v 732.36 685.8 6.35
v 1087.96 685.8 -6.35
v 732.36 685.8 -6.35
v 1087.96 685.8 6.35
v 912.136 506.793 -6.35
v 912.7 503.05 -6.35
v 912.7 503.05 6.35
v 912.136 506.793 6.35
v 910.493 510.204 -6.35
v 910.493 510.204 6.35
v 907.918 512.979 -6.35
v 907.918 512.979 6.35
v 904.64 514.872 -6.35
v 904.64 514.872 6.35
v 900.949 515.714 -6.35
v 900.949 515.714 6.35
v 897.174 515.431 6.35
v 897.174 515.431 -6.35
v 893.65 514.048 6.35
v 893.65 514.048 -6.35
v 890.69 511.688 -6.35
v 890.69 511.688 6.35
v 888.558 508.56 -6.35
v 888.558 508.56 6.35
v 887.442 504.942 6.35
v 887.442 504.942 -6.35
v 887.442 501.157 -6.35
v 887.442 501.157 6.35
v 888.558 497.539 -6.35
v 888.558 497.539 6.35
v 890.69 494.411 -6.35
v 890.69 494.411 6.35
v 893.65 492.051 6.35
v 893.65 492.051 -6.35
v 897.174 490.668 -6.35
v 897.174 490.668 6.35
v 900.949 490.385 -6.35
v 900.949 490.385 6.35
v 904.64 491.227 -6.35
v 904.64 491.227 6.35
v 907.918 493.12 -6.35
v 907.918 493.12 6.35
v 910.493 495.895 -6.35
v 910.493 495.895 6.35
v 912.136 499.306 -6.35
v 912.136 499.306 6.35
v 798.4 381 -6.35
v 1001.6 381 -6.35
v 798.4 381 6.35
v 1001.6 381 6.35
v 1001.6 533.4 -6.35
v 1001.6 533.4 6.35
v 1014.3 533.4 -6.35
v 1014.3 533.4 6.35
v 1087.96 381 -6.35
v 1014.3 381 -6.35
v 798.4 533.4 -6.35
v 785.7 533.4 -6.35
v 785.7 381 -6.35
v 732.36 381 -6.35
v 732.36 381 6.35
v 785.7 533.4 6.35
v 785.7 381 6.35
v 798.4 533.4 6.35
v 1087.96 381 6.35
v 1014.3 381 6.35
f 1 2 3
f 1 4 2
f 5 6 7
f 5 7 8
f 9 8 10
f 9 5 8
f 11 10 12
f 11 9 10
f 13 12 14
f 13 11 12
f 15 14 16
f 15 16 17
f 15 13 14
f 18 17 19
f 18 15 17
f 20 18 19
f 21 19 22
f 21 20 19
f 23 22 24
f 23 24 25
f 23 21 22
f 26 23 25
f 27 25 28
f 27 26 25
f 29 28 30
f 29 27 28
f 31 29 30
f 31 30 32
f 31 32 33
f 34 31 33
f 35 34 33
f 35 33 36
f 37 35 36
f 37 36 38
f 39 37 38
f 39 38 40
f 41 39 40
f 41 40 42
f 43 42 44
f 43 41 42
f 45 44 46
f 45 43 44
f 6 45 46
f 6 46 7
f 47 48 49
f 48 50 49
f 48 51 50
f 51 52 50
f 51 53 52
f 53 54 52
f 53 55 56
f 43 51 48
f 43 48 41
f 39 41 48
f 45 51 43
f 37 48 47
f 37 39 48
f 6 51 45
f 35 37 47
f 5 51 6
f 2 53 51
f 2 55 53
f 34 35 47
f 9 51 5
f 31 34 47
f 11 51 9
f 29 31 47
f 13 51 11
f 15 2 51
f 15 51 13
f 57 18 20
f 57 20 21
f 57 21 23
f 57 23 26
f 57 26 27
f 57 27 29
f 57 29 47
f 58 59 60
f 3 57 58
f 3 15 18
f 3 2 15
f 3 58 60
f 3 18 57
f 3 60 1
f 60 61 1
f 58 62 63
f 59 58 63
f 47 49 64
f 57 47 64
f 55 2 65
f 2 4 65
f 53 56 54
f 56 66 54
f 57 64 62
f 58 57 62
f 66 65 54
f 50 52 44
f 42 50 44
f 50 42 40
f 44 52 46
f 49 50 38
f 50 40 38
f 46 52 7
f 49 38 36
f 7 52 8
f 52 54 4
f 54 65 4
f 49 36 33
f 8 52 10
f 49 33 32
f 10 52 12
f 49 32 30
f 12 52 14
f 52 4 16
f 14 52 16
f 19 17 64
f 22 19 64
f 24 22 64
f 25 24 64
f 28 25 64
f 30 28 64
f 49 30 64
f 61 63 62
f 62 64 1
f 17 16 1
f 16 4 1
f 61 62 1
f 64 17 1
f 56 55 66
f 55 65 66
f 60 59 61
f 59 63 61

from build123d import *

# Parameters (mm, degrees)
BOSS_EXTRUDE1_DEPTH = 6.35
CAVITY1_START       = -6.35
CAVITY1_OUTLINE_R   = 12.7
CAVITY1_DEPTH       = 12.7


# Read off the part's stored shape, not the designer's step: Cavity1
with BuildPart() as part:
    # Sketch1 → Boss-Extrude1 (new, symmetric)
    with BuildSketch(Plane.XY):
        Polygon((785.7, 533.4), (785.7, 381), (732.36, 381), (732.36, 685.8), (785.7, 685.8), (1001.6, 685.8), (1087.96, 685.8), (1087.96, 381), (1014.3, 381), (1014.3, 533.4), (1001.6, 533.4), (1001.6, 381), (798.4, 381), (798.4, 533.4), align=None)
    extrude(amount=BOSS_EXTRUDE1_DEPTH, both=True)

    # Cavity1 outline → Cavity1 (cut)
    with BuildSketch(Plane.XY.offset(CAVITY1_START)):
        with Locations((900, 503.049546279)):
            Circle(CAVITY1_OUTLINE_R)
    extrude(amount=CAVITY1_DEPTH, mode=Mode.SUBTRACT)


solid = part.part
